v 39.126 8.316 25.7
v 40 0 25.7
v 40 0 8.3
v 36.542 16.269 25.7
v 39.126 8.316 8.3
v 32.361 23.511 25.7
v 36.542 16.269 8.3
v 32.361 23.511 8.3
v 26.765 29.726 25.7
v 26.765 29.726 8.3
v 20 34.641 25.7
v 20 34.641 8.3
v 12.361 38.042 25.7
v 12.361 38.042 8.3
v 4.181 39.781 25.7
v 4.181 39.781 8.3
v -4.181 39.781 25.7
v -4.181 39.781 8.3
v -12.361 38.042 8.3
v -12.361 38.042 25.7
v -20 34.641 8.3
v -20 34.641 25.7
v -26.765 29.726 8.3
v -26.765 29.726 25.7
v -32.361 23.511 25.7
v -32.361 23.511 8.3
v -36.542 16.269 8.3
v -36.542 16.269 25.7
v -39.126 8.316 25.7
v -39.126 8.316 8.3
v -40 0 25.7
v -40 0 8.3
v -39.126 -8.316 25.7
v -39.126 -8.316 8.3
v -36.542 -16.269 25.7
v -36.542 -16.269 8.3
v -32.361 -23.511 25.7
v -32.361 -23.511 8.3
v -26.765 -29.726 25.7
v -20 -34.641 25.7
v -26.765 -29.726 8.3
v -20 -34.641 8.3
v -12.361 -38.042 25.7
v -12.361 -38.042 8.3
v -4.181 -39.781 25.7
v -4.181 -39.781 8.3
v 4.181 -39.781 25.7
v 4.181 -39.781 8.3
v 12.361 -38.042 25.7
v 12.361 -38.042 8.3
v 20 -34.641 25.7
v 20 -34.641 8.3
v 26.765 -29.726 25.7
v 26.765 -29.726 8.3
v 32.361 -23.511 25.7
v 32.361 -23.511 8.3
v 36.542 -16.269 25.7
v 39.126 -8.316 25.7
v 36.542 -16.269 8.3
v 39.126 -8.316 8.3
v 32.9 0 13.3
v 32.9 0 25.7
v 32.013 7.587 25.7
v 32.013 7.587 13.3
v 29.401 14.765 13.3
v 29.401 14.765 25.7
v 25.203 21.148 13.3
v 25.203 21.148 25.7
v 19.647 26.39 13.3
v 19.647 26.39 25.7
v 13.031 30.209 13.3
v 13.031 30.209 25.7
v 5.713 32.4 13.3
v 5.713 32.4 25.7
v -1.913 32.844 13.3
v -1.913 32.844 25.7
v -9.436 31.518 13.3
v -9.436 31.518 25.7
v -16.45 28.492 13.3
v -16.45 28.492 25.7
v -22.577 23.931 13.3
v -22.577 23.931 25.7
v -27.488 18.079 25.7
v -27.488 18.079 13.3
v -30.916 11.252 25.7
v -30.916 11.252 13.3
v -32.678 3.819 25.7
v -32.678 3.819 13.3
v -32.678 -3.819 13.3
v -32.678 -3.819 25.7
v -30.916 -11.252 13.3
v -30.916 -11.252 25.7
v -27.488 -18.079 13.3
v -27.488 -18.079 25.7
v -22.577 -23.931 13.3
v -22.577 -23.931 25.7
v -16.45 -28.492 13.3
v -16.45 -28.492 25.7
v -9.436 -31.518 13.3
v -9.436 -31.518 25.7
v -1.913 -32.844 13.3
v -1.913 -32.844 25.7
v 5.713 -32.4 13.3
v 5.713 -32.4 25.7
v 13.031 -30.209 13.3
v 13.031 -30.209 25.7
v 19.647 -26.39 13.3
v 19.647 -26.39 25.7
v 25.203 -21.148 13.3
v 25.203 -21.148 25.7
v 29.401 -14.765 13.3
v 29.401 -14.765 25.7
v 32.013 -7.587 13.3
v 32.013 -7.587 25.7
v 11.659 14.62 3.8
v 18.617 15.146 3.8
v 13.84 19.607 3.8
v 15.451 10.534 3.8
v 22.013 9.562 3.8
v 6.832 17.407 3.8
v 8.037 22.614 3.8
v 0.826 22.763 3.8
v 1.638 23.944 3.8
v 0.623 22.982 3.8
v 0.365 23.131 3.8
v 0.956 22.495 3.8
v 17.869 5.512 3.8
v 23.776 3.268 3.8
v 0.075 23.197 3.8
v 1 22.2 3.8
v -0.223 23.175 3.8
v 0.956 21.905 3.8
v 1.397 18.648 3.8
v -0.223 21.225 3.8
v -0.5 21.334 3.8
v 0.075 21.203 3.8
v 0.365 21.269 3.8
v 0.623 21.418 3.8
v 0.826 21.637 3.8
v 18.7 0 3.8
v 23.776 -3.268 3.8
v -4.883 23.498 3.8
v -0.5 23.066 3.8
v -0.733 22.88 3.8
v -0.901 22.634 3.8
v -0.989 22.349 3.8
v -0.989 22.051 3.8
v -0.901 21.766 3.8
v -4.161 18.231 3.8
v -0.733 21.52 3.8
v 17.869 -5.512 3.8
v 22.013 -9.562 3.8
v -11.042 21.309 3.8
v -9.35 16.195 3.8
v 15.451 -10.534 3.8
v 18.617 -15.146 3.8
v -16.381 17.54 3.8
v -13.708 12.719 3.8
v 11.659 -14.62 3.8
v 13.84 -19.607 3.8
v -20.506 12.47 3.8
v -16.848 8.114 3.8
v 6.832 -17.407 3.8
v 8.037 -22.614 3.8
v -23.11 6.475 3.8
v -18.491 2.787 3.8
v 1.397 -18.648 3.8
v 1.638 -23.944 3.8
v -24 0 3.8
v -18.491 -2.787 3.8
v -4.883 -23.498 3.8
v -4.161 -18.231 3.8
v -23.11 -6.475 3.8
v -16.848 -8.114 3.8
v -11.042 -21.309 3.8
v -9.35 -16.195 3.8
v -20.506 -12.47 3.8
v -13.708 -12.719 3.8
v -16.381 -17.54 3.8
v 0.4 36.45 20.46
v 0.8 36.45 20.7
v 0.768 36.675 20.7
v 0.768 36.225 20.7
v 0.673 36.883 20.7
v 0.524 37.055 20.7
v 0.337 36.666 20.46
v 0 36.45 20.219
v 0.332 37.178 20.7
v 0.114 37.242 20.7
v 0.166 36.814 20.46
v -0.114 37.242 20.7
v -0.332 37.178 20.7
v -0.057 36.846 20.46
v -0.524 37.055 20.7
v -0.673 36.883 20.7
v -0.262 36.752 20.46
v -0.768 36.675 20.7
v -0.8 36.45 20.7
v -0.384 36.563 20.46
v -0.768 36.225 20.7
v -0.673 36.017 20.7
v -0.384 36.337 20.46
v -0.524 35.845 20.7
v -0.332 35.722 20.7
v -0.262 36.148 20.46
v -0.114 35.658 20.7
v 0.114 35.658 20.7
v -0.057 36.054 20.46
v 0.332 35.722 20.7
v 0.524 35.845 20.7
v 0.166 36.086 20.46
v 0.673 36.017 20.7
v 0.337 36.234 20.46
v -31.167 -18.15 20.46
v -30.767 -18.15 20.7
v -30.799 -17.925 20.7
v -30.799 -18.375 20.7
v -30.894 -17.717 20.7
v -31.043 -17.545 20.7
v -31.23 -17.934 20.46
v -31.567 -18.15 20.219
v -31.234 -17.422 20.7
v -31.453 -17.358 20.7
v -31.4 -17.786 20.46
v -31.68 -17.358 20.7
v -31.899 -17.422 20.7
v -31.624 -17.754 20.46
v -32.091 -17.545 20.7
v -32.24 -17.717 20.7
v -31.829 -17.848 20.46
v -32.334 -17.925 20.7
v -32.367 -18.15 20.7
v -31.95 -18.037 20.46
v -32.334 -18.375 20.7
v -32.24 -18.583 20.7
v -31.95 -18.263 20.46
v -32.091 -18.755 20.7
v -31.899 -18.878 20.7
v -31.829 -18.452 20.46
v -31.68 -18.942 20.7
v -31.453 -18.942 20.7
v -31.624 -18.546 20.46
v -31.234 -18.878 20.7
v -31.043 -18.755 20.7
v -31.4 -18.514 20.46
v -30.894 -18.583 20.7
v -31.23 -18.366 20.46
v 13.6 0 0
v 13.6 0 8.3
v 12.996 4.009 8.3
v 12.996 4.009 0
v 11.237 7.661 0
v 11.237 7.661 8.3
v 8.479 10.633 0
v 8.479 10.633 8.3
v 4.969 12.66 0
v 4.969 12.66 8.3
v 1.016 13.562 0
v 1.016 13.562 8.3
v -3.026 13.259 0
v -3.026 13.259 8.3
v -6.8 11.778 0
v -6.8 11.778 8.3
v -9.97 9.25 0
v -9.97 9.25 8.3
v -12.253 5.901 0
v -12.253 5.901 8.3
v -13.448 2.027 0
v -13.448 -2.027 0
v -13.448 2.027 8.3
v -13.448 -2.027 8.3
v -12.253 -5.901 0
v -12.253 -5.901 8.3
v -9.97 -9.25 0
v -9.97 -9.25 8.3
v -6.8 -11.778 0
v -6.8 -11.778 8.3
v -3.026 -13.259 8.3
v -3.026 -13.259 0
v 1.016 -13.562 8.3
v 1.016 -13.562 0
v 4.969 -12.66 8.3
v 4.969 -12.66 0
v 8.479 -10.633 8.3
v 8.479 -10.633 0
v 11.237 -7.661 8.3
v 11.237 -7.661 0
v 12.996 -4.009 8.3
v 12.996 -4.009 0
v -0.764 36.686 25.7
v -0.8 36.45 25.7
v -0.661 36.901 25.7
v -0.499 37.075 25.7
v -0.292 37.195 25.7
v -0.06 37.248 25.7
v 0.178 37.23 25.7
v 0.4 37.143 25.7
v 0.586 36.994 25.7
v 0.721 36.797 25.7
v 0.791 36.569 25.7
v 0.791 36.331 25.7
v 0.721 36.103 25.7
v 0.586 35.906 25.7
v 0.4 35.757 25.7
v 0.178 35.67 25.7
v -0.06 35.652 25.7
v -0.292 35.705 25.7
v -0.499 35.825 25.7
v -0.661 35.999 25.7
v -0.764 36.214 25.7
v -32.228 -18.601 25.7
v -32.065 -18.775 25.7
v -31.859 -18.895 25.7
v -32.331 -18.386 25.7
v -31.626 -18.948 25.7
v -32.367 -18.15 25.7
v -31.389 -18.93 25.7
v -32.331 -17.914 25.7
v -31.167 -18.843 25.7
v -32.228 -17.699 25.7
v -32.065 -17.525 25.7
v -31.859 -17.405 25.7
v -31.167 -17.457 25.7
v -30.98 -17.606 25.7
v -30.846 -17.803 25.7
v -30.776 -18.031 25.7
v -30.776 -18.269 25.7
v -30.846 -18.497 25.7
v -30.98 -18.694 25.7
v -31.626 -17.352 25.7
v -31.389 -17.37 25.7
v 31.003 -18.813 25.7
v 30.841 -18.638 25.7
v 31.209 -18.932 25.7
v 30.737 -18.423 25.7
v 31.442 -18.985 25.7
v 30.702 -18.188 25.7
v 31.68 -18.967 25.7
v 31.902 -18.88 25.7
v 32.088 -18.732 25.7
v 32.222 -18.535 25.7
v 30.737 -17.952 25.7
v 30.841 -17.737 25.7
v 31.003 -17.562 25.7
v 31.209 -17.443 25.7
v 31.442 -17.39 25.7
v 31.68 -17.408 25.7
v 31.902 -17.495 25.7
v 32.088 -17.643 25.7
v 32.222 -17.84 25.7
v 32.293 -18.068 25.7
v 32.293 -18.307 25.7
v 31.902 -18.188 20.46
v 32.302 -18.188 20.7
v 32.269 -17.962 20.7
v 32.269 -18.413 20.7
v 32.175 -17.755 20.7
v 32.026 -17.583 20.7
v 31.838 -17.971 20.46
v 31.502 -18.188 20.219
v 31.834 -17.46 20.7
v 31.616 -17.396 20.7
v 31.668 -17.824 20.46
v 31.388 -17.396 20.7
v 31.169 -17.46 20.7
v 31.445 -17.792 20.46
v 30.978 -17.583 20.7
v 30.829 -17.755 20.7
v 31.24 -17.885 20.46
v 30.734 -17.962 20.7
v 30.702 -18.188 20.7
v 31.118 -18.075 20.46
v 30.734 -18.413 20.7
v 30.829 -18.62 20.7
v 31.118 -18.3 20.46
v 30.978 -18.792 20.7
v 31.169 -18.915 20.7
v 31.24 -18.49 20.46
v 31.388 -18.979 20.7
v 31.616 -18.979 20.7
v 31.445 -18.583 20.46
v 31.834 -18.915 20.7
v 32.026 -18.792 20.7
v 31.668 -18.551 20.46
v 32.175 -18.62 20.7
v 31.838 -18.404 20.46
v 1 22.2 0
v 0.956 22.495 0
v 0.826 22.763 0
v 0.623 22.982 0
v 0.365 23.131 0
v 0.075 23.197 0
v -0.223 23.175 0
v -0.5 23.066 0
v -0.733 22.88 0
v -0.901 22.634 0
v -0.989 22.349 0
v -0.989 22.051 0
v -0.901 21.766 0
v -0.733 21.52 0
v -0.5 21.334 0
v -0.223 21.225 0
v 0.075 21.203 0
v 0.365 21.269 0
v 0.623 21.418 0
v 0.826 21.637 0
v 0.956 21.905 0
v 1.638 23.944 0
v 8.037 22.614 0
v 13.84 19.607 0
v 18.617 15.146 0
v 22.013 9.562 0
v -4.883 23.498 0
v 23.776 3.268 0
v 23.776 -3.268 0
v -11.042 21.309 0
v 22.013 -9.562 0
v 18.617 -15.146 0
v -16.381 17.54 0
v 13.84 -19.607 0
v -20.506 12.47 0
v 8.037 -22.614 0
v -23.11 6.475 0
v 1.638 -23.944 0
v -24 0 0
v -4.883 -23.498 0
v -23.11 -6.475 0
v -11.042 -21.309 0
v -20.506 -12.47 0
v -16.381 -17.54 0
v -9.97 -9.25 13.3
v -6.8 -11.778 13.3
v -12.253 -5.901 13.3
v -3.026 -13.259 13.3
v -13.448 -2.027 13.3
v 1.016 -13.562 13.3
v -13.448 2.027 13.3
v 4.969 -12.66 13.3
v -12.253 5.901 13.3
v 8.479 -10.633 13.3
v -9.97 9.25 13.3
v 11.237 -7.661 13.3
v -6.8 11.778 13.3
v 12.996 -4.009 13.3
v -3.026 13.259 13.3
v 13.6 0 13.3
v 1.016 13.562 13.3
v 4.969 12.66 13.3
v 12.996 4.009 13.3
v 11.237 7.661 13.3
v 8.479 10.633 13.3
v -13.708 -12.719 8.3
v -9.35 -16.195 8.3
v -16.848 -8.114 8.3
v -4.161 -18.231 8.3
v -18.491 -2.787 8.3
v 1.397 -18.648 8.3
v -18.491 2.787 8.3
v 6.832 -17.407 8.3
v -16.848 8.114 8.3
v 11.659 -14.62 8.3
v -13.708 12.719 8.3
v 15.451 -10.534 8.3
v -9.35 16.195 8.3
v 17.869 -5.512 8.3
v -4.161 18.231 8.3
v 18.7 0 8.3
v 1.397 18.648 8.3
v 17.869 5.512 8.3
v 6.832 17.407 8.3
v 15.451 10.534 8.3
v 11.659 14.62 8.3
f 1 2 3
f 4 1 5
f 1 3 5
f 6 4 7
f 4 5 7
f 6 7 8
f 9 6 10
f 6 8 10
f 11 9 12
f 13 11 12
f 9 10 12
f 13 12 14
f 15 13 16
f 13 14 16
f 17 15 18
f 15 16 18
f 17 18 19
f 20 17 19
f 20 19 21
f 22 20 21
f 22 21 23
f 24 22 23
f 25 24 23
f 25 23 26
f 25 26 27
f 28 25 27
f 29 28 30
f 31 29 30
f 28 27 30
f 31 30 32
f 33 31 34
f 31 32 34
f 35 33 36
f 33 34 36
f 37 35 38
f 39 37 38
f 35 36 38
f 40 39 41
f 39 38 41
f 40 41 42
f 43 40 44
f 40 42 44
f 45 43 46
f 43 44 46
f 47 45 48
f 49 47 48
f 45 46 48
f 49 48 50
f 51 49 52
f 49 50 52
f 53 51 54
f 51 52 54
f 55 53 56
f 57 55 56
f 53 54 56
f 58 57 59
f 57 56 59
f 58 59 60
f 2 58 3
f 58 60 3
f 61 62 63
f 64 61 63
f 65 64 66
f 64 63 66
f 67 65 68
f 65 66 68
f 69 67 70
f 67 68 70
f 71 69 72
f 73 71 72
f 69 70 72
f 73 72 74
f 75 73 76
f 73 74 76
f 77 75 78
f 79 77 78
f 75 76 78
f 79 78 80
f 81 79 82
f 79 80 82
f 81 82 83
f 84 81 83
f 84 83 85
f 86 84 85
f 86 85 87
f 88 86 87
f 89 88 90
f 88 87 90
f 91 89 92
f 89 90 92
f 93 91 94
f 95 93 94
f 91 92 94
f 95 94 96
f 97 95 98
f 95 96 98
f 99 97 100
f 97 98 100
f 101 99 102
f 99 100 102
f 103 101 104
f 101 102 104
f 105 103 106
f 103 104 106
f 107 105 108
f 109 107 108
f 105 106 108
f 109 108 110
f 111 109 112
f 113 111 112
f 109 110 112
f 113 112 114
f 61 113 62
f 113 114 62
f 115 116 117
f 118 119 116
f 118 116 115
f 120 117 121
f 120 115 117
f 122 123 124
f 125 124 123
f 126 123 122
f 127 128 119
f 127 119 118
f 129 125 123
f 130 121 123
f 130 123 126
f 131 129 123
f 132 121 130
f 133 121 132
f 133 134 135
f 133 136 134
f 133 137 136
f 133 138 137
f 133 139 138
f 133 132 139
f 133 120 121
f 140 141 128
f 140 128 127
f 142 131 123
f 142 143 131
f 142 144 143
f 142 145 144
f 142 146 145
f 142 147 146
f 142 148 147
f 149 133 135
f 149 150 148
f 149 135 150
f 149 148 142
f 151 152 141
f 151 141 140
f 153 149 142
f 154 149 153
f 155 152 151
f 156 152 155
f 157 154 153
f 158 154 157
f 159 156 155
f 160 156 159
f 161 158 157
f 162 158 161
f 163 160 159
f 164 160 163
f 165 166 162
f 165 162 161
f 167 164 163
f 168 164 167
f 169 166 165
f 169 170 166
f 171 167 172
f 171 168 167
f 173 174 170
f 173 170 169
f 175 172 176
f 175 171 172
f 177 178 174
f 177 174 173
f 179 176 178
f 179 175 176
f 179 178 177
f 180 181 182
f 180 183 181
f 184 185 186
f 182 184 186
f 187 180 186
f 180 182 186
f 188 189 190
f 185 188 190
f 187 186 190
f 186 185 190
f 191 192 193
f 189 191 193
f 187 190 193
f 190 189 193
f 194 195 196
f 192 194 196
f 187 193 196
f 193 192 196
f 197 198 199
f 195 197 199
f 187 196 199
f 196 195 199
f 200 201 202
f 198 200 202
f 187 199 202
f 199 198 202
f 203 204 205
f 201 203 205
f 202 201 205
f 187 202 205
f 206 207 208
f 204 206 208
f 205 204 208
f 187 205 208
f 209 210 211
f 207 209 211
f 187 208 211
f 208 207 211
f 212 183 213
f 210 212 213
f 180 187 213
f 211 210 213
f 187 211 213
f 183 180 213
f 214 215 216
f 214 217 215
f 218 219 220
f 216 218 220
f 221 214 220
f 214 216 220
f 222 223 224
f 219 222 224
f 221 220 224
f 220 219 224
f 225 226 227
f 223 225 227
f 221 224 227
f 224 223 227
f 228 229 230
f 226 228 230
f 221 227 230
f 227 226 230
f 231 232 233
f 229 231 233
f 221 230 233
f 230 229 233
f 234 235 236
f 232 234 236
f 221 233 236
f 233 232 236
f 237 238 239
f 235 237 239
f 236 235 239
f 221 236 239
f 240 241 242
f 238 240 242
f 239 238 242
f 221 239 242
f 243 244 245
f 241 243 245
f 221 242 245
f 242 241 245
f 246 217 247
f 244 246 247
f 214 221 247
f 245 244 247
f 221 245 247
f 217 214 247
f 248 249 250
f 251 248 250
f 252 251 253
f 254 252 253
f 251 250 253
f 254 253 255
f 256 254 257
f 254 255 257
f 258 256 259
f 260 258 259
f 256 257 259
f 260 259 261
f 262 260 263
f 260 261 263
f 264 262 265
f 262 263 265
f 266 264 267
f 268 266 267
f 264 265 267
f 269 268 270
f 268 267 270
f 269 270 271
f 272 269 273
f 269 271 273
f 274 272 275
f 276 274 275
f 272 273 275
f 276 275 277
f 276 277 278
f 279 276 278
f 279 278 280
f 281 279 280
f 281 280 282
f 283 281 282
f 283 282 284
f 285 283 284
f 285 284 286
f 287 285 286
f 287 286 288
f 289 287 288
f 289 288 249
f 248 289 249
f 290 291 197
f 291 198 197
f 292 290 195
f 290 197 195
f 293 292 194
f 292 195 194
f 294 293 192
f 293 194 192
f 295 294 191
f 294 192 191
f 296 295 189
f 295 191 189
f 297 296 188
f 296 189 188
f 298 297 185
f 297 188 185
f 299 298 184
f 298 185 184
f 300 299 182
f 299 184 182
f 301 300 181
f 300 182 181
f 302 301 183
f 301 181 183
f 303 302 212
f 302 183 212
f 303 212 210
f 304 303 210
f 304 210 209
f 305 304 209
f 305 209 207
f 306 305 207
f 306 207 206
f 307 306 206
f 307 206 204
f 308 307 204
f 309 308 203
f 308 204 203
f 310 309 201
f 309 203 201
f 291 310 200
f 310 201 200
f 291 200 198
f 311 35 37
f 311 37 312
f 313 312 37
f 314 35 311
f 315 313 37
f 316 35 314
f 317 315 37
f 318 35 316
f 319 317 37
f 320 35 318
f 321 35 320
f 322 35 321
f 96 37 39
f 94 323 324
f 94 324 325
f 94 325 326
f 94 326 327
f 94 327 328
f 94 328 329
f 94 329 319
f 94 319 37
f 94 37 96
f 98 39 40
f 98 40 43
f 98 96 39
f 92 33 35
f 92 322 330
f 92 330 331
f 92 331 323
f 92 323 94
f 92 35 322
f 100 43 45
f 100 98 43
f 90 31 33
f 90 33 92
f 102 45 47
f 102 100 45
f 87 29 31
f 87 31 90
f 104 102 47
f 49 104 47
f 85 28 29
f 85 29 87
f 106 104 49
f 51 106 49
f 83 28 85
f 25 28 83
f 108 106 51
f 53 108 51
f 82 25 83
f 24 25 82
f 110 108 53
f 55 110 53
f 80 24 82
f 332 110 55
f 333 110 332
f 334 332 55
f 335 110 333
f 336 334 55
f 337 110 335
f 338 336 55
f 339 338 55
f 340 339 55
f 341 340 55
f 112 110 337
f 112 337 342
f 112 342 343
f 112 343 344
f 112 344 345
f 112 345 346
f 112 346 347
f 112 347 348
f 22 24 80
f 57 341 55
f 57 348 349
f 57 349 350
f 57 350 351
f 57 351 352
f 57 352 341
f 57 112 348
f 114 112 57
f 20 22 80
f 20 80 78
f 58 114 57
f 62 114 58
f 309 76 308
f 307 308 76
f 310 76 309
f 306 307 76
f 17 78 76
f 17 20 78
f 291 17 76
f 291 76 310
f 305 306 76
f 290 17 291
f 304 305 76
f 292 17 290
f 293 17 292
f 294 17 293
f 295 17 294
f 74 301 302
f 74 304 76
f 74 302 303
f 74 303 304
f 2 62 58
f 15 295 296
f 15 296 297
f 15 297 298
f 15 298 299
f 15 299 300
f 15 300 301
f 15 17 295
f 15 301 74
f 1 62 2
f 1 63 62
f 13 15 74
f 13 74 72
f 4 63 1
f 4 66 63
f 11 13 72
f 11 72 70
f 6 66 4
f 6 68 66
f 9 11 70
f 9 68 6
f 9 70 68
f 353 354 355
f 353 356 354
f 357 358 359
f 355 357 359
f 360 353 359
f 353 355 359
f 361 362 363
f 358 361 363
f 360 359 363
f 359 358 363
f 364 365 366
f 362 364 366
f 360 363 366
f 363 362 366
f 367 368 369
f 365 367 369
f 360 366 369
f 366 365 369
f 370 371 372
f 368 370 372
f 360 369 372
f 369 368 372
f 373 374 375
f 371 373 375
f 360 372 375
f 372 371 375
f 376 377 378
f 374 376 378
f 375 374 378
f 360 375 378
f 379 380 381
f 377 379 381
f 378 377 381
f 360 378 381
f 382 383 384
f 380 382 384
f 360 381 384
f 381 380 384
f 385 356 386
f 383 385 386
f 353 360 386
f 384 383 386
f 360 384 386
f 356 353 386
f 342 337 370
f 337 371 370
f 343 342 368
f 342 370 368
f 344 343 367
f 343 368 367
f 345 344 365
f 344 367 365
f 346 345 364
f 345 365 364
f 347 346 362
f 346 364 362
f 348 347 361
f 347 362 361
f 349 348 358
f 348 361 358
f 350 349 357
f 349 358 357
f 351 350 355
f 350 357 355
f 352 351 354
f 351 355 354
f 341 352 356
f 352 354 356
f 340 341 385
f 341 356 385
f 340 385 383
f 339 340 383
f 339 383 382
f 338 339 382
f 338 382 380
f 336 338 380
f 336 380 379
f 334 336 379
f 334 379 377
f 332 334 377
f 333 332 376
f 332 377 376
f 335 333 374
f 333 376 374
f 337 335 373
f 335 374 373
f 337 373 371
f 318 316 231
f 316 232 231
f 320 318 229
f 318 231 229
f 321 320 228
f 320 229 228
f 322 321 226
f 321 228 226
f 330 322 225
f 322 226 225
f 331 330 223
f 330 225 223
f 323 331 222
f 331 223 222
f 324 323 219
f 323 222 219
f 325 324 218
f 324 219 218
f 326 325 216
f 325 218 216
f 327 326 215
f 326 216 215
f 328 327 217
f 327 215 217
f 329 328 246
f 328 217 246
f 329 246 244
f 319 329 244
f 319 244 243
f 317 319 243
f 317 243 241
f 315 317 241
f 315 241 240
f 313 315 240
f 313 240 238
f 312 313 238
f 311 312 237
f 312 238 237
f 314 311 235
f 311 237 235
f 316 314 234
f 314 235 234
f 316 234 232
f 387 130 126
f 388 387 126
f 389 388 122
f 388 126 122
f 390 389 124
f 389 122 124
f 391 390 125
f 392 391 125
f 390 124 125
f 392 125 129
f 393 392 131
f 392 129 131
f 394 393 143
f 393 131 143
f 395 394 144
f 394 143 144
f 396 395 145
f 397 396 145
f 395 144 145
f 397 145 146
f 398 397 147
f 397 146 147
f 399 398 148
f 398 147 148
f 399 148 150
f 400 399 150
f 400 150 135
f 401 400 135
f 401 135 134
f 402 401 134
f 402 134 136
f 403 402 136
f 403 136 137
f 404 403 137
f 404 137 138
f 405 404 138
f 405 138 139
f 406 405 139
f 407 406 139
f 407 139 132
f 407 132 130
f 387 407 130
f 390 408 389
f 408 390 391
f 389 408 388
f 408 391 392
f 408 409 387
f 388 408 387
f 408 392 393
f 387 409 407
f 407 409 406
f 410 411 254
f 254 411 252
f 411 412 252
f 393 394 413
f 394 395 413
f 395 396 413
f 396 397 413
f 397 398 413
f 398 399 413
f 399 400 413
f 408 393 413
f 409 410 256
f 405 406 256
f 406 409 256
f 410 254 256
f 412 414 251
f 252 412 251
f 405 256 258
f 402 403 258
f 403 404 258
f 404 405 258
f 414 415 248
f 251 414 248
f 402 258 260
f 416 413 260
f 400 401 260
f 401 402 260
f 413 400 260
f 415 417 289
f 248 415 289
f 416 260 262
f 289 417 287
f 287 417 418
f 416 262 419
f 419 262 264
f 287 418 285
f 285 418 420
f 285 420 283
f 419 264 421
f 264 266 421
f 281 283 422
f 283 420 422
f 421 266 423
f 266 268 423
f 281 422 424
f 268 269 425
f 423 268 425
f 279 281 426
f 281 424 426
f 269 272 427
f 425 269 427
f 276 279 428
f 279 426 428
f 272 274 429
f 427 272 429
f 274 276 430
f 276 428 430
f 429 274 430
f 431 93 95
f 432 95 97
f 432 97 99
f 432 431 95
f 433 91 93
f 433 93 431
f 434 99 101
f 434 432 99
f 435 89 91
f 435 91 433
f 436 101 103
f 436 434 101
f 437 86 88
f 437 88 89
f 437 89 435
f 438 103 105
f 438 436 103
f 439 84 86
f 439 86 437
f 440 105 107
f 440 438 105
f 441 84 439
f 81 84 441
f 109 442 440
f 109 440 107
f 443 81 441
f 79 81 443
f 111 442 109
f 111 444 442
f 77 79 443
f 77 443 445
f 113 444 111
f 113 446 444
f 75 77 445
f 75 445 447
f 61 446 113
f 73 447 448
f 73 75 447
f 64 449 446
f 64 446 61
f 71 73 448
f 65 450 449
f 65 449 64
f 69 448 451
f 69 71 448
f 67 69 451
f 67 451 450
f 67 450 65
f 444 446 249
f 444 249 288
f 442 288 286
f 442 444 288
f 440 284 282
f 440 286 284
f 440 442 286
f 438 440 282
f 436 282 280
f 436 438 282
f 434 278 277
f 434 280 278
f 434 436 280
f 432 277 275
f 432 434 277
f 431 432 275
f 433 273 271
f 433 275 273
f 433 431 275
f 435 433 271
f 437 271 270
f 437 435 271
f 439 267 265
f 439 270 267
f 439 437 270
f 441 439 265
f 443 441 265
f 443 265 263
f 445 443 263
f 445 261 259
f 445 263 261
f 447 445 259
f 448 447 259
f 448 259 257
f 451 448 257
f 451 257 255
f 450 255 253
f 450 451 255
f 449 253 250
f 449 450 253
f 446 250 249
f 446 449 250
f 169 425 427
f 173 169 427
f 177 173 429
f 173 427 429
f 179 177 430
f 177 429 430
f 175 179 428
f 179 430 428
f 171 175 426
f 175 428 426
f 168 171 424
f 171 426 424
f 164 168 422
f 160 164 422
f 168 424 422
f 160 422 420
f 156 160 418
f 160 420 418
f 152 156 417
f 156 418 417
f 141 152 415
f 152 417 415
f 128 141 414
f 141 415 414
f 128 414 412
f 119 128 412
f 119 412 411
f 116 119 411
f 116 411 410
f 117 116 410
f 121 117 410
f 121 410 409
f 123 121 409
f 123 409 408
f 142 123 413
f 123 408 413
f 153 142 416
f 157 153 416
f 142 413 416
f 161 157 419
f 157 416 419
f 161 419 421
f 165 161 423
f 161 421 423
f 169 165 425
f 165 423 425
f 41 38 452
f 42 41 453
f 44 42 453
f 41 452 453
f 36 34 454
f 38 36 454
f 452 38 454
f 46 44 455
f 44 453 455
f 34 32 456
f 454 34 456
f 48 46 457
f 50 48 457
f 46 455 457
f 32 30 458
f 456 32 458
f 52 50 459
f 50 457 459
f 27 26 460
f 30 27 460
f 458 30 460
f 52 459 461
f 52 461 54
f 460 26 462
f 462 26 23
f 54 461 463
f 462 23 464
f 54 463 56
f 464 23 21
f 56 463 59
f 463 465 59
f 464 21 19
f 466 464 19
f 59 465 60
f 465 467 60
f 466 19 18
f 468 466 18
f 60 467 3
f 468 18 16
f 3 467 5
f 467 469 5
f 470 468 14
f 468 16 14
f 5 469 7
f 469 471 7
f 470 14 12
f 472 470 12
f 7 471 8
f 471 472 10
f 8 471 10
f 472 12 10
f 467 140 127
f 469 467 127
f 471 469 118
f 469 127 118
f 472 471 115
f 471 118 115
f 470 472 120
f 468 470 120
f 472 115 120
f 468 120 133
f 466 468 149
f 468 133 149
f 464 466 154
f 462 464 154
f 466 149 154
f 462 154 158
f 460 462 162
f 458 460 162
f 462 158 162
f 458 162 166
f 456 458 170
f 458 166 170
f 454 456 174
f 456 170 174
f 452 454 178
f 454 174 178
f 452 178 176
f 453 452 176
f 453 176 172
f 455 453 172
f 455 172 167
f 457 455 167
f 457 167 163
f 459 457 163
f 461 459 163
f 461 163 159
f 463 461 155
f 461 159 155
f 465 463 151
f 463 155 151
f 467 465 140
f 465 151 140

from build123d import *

# Parameters (mm, degrees)
SKETCH1_R                 = 24
BOSS_EXTRUDE1_DEPTH       = 3.8
SKETCH2_R                 = 18.7
BOSS_EXTRUDE2_DEPTH       = 4.5
SKETCH3_R                 = 1
CUT_EXTRUDE1_DEPTH        = 4.5
SKETCH4_R                 = 13.6
CUT_EXTRUDE2_DEPTH        = 35.941236383
SKETCH5_R                 = 40
BOSS_EXTRUDE3_DEPTH       = 17.4
SKETCH6_R                 = 32.9
CUT_EXTRUDE6_DEPTH        = 12.4
CUT_EXTRUDE7_START        = -12.4
SKETCH7_R                 = 13.6
CUT_EXTRUDE7_DEPTH        = 12.4
M2X0_4_TAPPED_HOLE1_D     = 1.6
M2X0_4_TAPPED_HOLE1_DEPTH = 5
M2X0_4_TAPPED_HOLE1_TIP   = 0.480688495


with BuildPart() as part:
    # Sketch1 → Boss-Extrude1 (new body)
    with BuildSketch(Plane.XY):
        with Locations(Location((0, 0, 0), (0, 0, 180))):
            Circle(SKETCH1_R)
    extrude(amount=BOSS_EXTRUDE1_DEPTH)

    # Sketch2 → Boss-Extrude2 (add)
    with BuildSketch(Plane.XY.offset(3.8)):
        Circle(SKETCH2_R)
    extrude(amount=BOSS_EXTRUDE2_DEPTH)

    # Sketch3 → Cut-Extrude1 (cut)
    with BuildSketch(Plane.XY.offset(3.8)):
        with Locations((0, 22.2)):
            Circle(SKETCH3_R)
    extrude(amount=-CUT_EXTRUDE1_DEPTH, mode=Mode.SUBTRACT)

    # Sketch4 → Cut-Extrude2 (cut, through all)
    with BuildSketch(Plane.XY.offset(8.3)):
        Circle(SKETCH4_R)
    extrude(amount=-CUT_EXTRUDE2_DEPTH, mode=Mode.SUBTRACT)

    # Sketch5 → Boss-Extrude3 (add)
    with BuildSketch(Plane.XY.offset(8.3)):
        Circle(SKETCH5_R)
    extrude(amount=BOSS_EXTRUDE3_DEPTH)

    # Sketch6 → Cut-Extrude6 (cut)
    with BuildSketch(Plane.XY.offset(25.7)):
        Circle(SKETCH6_R)
    extrude(amount=-CUT_EXTRUDE6_DEPTH, mode=Mode.SUBTRACT)

    # Sketch7 → Cut-Extrude7 (cut)
    with BuildSketch(Plane(origin=(0, 0, 8.3), x_dir=(-1, 0, 0), z_dir=(0, 0, -1)).offset(CUT_EXTRUDE7_START)):
        with Locations(Location((0, 0, 0), (0, 0, 180))):
            Circle(SKETCH7_R)
    extrude(amount=CUT_EXTRUDE7_DEPTH, mode=Mode.SUBTRACT)

    # M2x0.4 Tapped Hole1
    with Locations(Plane(origin=(0, 36.45, 25.7), x_dir=(1, 0, 0), z_dir=(0, 0, 1))):
        with Locations((0, 0), (-31.566625968, -54.6), (31.501674063, -54.6375)):
            Hole(M2X0_4_TAPPED_HOLE1_D / 2, depth=M2X0_4_TAPPED_HOLE1_DEPTH)
            with Locations((0, 0, -(M2X0_4_TAPPED_HOLE1_DEPTH + M2X0_4_TAPPED_HOLE1_TIP / 2))):  # 118° drill point
                Cone(0, M2X0_4_TAPPED_HOLE1_D / 2, M2X0_4_TAPPED_HOLE1_TIP, mode=Mode.SUBTRACT)


solid = part.part
